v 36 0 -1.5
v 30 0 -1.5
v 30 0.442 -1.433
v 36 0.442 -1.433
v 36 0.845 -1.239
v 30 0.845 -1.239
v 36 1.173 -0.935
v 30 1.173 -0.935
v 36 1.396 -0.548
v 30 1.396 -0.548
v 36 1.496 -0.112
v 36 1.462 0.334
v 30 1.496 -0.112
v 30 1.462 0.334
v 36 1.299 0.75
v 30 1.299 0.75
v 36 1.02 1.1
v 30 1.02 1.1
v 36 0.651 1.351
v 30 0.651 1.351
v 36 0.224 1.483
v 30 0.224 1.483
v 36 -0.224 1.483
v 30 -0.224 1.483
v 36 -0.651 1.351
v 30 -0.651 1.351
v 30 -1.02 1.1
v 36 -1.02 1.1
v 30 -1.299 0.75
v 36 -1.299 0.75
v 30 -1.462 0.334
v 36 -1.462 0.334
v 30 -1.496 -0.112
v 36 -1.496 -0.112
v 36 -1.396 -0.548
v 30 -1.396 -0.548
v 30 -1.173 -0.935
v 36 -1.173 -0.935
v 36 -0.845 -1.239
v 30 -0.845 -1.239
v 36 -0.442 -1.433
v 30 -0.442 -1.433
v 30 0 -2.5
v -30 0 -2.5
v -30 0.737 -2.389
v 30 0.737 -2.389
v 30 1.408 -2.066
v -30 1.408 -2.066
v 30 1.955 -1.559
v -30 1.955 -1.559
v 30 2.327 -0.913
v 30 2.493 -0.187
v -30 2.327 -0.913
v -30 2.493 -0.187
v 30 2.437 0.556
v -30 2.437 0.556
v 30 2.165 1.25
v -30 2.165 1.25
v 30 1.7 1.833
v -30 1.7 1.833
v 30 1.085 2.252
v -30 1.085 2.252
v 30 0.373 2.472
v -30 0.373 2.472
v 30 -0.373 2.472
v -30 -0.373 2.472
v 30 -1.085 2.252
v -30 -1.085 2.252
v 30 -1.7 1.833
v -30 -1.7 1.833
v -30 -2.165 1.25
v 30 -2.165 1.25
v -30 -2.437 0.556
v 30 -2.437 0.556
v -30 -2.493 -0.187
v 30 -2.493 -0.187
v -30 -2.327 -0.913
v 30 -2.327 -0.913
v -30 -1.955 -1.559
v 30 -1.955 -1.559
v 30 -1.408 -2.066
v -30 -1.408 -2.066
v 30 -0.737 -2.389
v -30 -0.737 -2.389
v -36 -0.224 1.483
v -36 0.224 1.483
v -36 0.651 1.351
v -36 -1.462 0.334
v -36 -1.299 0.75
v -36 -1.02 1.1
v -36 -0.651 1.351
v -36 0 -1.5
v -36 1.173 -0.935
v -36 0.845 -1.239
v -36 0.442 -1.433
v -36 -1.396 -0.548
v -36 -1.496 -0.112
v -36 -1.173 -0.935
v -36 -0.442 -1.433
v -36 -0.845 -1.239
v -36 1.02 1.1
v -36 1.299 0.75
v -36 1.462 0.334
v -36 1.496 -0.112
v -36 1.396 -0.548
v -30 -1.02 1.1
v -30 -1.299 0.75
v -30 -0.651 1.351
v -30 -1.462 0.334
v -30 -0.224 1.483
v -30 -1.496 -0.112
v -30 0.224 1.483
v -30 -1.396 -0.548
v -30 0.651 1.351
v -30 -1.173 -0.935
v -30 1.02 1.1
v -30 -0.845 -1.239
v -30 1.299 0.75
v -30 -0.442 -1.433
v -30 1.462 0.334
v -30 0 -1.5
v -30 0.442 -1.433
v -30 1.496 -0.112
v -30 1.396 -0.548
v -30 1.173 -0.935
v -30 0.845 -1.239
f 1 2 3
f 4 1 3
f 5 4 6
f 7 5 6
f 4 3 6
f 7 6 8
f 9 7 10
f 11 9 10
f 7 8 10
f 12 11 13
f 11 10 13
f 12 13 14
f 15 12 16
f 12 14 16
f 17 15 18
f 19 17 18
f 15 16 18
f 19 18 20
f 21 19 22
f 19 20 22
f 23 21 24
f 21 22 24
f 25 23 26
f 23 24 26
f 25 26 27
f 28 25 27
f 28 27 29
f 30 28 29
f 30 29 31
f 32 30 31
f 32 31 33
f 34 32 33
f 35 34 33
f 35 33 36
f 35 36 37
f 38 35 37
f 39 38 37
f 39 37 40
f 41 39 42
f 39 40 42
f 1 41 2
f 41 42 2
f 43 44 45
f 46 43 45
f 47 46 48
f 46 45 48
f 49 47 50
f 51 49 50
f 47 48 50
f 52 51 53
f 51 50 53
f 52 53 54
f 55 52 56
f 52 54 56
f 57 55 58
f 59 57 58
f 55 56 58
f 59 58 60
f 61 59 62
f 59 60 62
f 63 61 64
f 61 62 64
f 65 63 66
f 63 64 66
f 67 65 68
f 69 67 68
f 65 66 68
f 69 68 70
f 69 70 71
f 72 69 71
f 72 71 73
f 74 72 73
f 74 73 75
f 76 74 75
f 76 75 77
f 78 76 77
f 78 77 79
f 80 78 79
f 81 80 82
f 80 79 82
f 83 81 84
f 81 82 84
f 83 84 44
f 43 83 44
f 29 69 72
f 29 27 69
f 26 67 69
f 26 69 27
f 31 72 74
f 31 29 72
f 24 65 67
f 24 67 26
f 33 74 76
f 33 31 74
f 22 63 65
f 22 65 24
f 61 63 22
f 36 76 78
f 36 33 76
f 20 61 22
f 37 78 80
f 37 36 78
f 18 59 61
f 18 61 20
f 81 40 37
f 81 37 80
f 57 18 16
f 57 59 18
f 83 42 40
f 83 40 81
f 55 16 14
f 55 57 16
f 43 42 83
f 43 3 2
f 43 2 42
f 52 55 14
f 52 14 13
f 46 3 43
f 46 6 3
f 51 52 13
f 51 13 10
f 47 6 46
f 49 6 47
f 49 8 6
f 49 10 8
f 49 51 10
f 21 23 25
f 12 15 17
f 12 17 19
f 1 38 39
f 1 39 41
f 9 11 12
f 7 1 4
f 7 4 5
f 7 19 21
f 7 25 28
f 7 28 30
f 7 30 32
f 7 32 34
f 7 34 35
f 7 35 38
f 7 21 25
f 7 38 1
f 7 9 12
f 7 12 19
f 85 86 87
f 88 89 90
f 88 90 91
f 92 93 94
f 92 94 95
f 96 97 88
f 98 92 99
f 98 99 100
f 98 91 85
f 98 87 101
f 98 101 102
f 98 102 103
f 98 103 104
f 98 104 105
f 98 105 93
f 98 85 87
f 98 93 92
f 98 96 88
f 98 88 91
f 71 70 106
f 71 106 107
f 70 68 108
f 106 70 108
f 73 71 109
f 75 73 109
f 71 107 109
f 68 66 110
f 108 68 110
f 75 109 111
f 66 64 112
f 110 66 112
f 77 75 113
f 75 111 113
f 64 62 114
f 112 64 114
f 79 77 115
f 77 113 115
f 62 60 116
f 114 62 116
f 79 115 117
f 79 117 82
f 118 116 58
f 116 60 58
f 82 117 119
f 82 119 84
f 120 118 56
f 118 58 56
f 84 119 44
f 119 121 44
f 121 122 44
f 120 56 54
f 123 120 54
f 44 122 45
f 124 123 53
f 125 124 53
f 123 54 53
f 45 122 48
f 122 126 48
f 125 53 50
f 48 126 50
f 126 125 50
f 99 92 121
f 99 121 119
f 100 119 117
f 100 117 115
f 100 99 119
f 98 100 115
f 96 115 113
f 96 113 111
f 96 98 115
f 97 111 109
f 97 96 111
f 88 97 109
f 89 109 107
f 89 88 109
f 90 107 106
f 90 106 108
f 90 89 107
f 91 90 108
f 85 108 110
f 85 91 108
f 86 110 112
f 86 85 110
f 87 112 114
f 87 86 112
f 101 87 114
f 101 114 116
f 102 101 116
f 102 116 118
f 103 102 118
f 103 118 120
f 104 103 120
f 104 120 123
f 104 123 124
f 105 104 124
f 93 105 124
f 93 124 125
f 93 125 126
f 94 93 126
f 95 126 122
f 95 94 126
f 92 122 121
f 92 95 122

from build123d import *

# Parameters (mm, degrees)
EXTRUDE_1_DEPTH      = 30
EXTRUDE_1_DEPTH_BACK = 30
SKETCH_1_R           = 2.5
SKETCH_2_R           = 1.5
EXTRUDE_2_DEPTH      = 6
EXTRUDE_START        = 6
SKETCH_3_R           = 1.5
EXTRUDE_3_DEPTH      = 6


with BuildPart() as part:
    # 草图1 → 凸台-拉伸1 (new, two sides: drawn at the far end of the back side and taken through both)
    with BuildSketch(Plane(origin=(0, 0, 0), x_dir=(0, 0, -1), z_dir=(1, 0, 0)).offset(-EXTRUDE_1_DEPTH_BACK)):
        Circle(SKETCH_1_R)
    extrude(amount=EXTRUDE_1_DEPTH + EXTRUDE_1_DEPTH_BACK)

    # 草图2 → 凸台-拉伸2 (add)
    with BuildSketch(Plane(origin=(30, 0, 0), x_dir=(0, 0, -1), z_dir=(1, 0, 0))):
        Circle(SKETCH_2_R)
    extrude(amount=EXTRUDE_2_DEPTH)

    # 草图3 → 凸台-拉伸3 (add)
    with BuildSketch(Plane.ZY.offset(30).offset(EXTRUDE_START)):
        Circle(SKETCH_3_R)
    extrude(amount=-EXTRUDE_3_DEPTH)


solid = part.part
